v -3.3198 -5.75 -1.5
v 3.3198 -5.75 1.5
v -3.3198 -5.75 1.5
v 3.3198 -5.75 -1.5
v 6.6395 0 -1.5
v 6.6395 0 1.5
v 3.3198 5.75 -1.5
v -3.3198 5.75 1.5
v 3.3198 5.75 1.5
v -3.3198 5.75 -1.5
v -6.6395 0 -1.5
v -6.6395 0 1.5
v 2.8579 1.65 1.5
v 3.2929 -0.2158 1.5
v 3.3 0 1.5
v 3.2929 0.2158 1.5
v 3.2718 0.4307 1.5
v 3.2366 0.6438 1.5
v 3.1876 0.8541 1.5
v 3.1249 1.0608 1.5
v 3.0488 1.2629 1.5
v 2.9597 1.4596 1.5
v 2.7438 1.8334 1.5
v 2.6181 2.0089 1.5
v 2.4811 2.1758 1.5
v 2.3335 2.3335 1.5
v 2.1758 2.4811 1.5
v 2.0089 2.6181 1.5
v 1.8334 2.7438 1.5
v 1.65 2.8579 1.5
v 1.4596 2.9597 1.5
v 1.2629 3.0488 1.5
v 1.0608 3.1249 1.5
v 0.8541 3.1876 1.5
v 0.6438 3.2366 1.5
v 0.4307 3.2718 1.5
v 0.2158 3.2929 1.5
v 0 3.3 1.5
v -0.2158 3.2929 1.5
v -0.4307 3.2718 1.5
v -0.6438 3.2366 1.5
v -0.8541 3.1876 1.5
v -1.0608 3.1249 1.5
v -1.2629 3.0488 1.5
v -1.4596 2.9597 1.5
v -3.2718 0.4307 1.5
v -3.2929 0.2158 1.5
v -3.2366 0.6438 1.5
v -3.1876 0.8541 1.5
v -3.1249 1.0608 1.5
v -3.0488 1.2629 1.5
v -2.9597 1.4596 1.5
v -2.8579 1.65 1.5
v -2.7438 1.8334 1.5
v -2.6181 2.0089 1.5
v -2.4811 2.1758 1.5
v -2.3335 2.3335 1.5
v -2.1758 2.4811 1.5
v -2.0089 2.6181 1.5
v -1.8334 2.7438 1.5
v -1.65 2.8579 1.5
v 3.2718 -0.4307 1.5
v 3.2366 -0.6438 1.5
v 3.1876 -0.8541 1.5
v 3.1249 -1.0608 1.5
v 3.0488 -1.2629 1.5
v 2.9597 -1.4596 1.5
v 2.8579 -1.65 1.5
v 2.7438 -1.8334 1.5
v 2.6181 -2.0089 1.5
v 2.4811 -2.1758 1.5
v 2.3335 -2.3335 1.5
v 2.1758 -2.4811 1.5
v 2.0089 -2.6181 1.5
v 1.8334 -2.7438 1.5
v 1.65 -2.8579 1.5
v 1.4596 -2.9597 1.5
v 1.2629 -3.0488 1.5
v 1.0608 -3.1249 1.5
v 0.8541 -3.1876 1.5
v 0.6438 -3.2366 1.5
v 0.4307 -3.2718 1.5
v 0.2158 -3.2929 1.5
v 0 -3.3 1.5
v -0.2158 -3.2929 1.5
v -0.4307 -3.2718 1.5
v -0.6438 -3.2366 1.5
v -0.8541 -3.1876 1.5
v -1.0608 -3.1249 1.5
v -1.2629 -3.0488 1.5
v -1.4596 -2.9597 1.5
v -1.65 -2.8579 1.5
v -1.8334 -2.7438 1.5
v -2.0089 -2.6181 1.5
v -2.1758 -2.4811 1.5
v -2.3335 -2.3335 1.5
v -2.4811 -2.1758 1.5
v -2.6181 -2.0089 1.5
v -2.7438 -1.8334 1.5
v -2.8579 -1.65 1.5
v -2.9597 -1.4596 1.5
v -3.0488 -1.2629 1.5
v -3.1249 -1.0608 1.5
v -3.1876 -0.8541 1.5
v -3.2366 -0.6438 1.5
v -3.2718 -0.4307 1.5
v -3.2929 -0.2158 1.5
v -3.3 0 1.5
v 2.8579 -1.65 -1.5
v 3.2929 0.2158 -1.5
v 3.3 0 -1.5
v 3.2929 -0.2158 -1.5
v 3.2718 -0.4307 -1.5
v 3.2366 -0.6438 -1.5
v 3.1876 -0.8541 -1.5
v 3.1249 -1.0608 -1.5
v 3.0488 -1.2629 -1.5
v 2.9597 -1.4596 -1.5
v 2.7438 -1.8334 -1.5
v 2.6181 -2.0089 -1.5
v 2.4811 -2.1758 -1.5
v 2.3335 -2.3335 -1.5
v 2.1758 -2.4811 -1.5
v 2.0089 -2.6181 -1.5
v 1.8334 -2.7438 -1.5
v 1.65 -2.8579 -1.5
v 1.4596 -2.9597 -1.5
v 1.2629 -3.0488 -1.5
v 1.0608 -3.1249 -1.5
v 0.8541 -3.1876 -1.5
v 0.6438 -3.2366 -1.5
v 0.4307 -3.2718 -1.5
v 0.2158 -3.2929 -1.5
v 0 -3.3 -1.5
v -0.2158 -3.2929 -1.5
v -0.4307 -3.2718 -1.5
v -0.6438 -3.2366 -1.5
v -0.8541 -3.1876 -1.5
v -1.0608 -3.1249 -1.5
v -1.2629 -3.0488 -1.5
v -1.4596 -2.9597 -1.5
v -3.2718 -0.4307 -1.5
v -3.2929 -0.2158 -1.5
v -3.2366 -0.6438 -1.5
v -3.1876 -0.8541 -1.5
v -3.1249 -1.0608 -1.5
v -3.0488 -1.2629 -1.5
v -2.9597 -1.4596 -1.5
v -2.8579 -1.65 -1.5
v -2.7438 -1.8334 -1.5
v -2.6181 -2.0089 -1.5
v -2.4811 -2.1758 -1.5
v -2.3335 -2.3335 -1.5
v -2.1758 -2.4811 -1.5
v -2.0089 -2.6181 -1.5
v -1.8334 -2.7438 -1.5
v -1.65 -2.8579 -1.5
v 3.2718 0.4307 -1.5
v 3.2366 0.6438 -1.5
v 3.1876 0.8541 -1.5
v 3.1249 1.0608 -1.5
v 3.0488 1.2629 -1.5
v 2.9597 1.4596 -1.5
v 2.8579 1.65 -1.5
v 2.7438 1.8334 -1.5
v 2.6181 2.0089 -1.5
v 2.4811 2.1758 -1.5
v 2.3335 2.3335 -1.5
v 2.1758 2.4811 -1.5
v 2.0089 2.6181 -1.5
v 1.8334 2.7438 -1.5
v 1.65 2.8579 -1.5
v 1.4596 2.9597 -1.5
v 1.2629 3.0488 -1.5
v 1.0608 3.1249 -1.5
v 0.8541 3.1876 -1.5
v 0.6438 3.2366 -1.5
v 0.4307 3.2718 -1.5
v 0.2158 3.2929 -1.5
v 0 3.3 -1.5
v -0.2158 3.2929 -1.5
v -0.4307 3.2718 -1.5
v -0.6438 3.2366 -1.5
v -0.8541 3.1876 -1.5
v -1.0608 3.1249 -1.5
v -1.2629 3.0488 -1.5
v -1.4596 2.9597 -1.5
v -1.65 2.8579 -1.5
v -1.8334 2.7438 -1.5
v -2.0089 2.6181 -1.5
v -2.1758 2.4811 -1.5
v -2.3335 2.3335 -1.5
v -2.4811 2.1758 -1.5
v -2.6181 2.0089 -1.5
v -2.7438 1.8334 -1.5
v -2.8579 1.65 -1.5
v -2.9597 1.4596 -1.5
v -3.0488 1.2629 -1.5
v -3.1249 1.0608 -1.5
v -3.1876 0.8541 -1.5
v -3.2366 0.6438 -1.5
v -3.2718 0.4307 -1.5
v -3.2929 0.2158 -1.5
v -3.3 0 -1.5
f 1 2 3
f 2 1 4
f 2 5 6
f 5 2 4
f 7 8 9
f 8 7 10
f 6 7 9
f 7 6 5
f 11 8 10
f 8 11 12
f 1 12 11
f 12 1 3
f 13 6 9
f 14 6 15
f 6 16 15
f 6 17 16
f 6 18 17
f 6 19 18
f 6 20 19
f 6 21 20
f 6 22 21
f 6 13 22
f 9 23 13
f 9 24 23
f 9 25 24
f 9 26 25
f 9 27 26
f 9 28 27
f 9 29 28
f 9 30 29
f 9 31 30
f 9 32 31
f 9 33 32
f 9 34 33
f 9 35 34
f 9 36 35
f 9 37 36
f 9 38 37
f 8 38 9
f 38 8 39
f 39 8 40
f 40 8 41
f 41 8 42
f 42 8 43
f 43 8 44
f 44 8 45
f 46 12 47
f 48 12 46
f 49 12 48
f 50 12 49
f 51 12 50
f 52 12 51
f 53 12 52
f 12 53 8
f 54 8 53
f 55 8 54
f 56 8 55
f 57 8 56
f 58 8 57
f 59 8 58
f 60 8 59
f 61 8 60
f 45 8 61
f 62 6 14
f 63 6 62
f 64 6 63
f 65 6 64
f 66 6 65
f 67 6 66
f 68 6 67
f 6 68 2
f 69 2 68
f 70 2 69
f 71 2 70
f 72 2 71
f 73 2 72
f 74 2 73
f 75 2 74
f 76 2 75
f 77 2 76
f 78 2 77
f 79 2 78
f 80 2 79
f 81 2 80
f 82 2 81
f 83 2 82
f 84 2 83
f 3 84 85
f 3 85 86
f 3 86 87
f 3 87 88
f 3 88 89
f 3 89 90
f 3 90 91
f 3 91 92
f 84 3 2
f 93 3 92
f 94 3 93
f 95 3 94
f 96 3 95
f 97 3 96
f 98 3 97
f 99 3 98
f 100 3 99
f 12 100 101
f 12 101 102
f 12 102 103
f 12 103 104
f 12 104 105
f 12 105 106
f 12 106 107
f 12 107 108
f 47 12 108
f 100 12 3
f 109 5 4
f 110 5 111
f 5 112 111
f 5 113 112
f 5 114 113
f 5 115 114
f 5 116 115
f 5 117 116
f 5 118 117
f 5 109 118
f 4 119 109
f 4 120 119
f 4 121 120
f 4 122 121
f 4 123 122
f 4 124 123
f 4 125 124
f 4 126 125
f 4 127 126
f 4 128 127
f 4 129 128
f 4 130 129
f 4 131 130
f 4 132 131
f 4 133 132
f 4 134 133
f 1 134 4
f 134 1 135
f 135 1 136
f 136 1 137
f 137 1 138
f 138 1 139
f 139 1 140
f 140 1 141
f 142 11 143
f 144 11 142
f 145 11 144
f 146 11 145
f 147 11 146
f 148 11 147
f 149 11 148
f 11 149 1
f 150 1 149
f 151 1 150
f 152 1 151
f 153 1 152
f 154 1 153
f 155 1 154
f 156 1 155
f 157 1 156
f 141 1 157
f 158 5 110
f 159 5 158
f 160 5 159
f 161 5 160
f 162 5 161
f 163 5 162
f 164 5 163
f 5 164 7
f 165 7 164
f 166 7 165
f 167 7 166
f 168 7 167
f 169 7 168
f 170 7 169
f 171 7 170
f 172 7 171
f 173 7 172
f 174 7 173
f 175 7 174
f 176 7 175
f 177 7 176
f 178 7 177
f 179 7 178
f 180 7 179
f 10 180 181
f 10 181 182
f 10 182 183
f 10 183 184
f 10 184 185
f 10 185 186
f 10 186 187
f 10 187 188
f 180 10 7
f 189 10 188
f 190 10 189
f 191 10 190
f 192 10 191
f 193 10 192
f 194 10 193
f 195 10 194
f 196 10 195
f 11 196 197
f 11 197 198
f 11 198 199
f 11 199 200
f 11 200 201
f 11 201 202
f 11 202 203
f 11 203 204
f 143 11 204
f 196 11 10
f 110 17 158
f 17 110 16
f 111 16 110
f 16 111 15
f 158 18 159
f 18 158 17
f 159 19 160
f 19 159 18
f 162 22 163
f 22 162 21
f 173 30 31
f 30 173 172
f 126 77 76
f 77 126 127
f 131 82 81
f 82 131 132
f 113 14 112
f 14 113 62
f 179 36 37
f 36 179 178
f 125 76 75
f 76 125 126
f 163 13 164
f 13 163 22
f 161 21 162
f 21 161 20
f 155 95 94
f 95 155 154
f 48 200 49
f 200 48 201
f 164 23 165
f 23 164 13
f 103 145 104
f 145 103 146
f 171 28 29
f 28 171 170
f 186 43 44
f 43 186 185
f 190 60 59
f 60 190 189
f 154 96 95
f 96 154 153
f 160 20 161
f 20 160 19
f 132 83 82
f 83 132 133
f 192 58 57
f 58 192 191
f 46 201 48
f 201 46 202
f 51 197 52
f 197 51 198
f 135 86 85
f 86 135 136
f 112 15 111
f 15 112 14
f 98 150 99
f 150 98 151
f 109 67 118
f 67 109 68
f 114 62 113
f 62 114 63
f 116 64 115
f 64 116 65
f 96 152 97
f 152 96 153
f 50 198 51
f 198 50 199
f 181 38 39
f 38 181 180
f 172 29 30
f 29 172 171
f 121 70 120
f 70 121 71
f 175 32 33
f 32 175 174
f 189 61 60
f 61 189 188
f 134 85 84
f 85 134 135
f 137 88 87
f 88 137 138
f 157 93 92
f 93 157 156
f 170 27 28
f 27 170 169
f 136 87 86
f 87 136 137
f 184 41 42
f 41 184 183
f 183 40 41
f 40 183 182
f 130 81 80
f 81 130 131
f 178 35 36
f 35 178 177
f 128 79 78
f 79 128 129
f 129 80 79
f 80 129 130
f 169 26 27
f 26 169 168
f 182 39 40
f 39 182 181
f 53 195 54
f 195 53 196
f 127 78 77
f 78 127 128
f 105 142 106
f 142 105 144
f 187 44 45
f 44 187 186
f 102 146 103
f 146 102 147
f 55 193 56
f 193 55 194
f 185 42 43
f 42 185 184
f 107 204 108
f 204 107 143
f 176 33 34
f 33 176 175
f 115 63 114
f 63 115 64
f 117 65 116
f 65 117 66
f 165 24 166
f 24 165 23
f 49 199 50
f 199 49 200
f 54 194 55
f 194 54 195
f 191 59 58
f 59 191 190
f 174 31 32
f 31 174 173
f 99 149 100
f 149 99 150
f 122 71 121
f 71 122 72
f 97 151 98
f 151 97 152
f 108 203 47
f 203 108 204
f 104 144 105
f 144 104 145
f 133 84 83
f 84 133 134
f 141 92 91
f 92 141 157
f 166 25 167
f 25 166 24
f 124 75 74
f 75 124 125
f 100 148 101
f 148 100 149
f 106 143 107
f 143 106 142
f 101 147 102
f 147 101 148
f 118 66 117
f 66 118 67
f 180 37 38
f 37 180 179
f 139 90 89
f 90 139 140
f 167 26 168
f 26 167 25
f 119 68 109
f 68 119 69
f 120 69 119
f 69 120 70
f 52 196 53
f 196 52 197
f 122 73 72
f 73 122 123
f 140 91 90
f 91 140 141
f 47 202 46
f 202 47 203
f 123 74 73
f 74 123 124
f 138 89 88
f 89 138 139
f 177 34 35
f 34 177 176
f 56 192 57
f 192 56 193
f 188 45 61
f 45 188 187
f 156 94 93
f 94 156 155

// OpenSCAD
$fn=96;

module hex_prism_across_flats(af=11.5, h=3.0){
    r = af / sqrt(3);
    cylinder(h=h, r=r, center=true, $fn=6);
}

module clearance_hole(d=6.6, h=3.0){
    cylinder(h=h+0.4, d=d, center=true, $fn=96);
}

module hex_nut_m6(af=11.5, thickness=3.0, hole_d=6.6){
    difference(){
        hex_prism_across_flats(af=af, h=thickness);
        clearance_hole(d=hole_d, h=thickness);
    }
}

hex_nut_m6(af=11.5, thickness=3.0, hole_d=6.6);
